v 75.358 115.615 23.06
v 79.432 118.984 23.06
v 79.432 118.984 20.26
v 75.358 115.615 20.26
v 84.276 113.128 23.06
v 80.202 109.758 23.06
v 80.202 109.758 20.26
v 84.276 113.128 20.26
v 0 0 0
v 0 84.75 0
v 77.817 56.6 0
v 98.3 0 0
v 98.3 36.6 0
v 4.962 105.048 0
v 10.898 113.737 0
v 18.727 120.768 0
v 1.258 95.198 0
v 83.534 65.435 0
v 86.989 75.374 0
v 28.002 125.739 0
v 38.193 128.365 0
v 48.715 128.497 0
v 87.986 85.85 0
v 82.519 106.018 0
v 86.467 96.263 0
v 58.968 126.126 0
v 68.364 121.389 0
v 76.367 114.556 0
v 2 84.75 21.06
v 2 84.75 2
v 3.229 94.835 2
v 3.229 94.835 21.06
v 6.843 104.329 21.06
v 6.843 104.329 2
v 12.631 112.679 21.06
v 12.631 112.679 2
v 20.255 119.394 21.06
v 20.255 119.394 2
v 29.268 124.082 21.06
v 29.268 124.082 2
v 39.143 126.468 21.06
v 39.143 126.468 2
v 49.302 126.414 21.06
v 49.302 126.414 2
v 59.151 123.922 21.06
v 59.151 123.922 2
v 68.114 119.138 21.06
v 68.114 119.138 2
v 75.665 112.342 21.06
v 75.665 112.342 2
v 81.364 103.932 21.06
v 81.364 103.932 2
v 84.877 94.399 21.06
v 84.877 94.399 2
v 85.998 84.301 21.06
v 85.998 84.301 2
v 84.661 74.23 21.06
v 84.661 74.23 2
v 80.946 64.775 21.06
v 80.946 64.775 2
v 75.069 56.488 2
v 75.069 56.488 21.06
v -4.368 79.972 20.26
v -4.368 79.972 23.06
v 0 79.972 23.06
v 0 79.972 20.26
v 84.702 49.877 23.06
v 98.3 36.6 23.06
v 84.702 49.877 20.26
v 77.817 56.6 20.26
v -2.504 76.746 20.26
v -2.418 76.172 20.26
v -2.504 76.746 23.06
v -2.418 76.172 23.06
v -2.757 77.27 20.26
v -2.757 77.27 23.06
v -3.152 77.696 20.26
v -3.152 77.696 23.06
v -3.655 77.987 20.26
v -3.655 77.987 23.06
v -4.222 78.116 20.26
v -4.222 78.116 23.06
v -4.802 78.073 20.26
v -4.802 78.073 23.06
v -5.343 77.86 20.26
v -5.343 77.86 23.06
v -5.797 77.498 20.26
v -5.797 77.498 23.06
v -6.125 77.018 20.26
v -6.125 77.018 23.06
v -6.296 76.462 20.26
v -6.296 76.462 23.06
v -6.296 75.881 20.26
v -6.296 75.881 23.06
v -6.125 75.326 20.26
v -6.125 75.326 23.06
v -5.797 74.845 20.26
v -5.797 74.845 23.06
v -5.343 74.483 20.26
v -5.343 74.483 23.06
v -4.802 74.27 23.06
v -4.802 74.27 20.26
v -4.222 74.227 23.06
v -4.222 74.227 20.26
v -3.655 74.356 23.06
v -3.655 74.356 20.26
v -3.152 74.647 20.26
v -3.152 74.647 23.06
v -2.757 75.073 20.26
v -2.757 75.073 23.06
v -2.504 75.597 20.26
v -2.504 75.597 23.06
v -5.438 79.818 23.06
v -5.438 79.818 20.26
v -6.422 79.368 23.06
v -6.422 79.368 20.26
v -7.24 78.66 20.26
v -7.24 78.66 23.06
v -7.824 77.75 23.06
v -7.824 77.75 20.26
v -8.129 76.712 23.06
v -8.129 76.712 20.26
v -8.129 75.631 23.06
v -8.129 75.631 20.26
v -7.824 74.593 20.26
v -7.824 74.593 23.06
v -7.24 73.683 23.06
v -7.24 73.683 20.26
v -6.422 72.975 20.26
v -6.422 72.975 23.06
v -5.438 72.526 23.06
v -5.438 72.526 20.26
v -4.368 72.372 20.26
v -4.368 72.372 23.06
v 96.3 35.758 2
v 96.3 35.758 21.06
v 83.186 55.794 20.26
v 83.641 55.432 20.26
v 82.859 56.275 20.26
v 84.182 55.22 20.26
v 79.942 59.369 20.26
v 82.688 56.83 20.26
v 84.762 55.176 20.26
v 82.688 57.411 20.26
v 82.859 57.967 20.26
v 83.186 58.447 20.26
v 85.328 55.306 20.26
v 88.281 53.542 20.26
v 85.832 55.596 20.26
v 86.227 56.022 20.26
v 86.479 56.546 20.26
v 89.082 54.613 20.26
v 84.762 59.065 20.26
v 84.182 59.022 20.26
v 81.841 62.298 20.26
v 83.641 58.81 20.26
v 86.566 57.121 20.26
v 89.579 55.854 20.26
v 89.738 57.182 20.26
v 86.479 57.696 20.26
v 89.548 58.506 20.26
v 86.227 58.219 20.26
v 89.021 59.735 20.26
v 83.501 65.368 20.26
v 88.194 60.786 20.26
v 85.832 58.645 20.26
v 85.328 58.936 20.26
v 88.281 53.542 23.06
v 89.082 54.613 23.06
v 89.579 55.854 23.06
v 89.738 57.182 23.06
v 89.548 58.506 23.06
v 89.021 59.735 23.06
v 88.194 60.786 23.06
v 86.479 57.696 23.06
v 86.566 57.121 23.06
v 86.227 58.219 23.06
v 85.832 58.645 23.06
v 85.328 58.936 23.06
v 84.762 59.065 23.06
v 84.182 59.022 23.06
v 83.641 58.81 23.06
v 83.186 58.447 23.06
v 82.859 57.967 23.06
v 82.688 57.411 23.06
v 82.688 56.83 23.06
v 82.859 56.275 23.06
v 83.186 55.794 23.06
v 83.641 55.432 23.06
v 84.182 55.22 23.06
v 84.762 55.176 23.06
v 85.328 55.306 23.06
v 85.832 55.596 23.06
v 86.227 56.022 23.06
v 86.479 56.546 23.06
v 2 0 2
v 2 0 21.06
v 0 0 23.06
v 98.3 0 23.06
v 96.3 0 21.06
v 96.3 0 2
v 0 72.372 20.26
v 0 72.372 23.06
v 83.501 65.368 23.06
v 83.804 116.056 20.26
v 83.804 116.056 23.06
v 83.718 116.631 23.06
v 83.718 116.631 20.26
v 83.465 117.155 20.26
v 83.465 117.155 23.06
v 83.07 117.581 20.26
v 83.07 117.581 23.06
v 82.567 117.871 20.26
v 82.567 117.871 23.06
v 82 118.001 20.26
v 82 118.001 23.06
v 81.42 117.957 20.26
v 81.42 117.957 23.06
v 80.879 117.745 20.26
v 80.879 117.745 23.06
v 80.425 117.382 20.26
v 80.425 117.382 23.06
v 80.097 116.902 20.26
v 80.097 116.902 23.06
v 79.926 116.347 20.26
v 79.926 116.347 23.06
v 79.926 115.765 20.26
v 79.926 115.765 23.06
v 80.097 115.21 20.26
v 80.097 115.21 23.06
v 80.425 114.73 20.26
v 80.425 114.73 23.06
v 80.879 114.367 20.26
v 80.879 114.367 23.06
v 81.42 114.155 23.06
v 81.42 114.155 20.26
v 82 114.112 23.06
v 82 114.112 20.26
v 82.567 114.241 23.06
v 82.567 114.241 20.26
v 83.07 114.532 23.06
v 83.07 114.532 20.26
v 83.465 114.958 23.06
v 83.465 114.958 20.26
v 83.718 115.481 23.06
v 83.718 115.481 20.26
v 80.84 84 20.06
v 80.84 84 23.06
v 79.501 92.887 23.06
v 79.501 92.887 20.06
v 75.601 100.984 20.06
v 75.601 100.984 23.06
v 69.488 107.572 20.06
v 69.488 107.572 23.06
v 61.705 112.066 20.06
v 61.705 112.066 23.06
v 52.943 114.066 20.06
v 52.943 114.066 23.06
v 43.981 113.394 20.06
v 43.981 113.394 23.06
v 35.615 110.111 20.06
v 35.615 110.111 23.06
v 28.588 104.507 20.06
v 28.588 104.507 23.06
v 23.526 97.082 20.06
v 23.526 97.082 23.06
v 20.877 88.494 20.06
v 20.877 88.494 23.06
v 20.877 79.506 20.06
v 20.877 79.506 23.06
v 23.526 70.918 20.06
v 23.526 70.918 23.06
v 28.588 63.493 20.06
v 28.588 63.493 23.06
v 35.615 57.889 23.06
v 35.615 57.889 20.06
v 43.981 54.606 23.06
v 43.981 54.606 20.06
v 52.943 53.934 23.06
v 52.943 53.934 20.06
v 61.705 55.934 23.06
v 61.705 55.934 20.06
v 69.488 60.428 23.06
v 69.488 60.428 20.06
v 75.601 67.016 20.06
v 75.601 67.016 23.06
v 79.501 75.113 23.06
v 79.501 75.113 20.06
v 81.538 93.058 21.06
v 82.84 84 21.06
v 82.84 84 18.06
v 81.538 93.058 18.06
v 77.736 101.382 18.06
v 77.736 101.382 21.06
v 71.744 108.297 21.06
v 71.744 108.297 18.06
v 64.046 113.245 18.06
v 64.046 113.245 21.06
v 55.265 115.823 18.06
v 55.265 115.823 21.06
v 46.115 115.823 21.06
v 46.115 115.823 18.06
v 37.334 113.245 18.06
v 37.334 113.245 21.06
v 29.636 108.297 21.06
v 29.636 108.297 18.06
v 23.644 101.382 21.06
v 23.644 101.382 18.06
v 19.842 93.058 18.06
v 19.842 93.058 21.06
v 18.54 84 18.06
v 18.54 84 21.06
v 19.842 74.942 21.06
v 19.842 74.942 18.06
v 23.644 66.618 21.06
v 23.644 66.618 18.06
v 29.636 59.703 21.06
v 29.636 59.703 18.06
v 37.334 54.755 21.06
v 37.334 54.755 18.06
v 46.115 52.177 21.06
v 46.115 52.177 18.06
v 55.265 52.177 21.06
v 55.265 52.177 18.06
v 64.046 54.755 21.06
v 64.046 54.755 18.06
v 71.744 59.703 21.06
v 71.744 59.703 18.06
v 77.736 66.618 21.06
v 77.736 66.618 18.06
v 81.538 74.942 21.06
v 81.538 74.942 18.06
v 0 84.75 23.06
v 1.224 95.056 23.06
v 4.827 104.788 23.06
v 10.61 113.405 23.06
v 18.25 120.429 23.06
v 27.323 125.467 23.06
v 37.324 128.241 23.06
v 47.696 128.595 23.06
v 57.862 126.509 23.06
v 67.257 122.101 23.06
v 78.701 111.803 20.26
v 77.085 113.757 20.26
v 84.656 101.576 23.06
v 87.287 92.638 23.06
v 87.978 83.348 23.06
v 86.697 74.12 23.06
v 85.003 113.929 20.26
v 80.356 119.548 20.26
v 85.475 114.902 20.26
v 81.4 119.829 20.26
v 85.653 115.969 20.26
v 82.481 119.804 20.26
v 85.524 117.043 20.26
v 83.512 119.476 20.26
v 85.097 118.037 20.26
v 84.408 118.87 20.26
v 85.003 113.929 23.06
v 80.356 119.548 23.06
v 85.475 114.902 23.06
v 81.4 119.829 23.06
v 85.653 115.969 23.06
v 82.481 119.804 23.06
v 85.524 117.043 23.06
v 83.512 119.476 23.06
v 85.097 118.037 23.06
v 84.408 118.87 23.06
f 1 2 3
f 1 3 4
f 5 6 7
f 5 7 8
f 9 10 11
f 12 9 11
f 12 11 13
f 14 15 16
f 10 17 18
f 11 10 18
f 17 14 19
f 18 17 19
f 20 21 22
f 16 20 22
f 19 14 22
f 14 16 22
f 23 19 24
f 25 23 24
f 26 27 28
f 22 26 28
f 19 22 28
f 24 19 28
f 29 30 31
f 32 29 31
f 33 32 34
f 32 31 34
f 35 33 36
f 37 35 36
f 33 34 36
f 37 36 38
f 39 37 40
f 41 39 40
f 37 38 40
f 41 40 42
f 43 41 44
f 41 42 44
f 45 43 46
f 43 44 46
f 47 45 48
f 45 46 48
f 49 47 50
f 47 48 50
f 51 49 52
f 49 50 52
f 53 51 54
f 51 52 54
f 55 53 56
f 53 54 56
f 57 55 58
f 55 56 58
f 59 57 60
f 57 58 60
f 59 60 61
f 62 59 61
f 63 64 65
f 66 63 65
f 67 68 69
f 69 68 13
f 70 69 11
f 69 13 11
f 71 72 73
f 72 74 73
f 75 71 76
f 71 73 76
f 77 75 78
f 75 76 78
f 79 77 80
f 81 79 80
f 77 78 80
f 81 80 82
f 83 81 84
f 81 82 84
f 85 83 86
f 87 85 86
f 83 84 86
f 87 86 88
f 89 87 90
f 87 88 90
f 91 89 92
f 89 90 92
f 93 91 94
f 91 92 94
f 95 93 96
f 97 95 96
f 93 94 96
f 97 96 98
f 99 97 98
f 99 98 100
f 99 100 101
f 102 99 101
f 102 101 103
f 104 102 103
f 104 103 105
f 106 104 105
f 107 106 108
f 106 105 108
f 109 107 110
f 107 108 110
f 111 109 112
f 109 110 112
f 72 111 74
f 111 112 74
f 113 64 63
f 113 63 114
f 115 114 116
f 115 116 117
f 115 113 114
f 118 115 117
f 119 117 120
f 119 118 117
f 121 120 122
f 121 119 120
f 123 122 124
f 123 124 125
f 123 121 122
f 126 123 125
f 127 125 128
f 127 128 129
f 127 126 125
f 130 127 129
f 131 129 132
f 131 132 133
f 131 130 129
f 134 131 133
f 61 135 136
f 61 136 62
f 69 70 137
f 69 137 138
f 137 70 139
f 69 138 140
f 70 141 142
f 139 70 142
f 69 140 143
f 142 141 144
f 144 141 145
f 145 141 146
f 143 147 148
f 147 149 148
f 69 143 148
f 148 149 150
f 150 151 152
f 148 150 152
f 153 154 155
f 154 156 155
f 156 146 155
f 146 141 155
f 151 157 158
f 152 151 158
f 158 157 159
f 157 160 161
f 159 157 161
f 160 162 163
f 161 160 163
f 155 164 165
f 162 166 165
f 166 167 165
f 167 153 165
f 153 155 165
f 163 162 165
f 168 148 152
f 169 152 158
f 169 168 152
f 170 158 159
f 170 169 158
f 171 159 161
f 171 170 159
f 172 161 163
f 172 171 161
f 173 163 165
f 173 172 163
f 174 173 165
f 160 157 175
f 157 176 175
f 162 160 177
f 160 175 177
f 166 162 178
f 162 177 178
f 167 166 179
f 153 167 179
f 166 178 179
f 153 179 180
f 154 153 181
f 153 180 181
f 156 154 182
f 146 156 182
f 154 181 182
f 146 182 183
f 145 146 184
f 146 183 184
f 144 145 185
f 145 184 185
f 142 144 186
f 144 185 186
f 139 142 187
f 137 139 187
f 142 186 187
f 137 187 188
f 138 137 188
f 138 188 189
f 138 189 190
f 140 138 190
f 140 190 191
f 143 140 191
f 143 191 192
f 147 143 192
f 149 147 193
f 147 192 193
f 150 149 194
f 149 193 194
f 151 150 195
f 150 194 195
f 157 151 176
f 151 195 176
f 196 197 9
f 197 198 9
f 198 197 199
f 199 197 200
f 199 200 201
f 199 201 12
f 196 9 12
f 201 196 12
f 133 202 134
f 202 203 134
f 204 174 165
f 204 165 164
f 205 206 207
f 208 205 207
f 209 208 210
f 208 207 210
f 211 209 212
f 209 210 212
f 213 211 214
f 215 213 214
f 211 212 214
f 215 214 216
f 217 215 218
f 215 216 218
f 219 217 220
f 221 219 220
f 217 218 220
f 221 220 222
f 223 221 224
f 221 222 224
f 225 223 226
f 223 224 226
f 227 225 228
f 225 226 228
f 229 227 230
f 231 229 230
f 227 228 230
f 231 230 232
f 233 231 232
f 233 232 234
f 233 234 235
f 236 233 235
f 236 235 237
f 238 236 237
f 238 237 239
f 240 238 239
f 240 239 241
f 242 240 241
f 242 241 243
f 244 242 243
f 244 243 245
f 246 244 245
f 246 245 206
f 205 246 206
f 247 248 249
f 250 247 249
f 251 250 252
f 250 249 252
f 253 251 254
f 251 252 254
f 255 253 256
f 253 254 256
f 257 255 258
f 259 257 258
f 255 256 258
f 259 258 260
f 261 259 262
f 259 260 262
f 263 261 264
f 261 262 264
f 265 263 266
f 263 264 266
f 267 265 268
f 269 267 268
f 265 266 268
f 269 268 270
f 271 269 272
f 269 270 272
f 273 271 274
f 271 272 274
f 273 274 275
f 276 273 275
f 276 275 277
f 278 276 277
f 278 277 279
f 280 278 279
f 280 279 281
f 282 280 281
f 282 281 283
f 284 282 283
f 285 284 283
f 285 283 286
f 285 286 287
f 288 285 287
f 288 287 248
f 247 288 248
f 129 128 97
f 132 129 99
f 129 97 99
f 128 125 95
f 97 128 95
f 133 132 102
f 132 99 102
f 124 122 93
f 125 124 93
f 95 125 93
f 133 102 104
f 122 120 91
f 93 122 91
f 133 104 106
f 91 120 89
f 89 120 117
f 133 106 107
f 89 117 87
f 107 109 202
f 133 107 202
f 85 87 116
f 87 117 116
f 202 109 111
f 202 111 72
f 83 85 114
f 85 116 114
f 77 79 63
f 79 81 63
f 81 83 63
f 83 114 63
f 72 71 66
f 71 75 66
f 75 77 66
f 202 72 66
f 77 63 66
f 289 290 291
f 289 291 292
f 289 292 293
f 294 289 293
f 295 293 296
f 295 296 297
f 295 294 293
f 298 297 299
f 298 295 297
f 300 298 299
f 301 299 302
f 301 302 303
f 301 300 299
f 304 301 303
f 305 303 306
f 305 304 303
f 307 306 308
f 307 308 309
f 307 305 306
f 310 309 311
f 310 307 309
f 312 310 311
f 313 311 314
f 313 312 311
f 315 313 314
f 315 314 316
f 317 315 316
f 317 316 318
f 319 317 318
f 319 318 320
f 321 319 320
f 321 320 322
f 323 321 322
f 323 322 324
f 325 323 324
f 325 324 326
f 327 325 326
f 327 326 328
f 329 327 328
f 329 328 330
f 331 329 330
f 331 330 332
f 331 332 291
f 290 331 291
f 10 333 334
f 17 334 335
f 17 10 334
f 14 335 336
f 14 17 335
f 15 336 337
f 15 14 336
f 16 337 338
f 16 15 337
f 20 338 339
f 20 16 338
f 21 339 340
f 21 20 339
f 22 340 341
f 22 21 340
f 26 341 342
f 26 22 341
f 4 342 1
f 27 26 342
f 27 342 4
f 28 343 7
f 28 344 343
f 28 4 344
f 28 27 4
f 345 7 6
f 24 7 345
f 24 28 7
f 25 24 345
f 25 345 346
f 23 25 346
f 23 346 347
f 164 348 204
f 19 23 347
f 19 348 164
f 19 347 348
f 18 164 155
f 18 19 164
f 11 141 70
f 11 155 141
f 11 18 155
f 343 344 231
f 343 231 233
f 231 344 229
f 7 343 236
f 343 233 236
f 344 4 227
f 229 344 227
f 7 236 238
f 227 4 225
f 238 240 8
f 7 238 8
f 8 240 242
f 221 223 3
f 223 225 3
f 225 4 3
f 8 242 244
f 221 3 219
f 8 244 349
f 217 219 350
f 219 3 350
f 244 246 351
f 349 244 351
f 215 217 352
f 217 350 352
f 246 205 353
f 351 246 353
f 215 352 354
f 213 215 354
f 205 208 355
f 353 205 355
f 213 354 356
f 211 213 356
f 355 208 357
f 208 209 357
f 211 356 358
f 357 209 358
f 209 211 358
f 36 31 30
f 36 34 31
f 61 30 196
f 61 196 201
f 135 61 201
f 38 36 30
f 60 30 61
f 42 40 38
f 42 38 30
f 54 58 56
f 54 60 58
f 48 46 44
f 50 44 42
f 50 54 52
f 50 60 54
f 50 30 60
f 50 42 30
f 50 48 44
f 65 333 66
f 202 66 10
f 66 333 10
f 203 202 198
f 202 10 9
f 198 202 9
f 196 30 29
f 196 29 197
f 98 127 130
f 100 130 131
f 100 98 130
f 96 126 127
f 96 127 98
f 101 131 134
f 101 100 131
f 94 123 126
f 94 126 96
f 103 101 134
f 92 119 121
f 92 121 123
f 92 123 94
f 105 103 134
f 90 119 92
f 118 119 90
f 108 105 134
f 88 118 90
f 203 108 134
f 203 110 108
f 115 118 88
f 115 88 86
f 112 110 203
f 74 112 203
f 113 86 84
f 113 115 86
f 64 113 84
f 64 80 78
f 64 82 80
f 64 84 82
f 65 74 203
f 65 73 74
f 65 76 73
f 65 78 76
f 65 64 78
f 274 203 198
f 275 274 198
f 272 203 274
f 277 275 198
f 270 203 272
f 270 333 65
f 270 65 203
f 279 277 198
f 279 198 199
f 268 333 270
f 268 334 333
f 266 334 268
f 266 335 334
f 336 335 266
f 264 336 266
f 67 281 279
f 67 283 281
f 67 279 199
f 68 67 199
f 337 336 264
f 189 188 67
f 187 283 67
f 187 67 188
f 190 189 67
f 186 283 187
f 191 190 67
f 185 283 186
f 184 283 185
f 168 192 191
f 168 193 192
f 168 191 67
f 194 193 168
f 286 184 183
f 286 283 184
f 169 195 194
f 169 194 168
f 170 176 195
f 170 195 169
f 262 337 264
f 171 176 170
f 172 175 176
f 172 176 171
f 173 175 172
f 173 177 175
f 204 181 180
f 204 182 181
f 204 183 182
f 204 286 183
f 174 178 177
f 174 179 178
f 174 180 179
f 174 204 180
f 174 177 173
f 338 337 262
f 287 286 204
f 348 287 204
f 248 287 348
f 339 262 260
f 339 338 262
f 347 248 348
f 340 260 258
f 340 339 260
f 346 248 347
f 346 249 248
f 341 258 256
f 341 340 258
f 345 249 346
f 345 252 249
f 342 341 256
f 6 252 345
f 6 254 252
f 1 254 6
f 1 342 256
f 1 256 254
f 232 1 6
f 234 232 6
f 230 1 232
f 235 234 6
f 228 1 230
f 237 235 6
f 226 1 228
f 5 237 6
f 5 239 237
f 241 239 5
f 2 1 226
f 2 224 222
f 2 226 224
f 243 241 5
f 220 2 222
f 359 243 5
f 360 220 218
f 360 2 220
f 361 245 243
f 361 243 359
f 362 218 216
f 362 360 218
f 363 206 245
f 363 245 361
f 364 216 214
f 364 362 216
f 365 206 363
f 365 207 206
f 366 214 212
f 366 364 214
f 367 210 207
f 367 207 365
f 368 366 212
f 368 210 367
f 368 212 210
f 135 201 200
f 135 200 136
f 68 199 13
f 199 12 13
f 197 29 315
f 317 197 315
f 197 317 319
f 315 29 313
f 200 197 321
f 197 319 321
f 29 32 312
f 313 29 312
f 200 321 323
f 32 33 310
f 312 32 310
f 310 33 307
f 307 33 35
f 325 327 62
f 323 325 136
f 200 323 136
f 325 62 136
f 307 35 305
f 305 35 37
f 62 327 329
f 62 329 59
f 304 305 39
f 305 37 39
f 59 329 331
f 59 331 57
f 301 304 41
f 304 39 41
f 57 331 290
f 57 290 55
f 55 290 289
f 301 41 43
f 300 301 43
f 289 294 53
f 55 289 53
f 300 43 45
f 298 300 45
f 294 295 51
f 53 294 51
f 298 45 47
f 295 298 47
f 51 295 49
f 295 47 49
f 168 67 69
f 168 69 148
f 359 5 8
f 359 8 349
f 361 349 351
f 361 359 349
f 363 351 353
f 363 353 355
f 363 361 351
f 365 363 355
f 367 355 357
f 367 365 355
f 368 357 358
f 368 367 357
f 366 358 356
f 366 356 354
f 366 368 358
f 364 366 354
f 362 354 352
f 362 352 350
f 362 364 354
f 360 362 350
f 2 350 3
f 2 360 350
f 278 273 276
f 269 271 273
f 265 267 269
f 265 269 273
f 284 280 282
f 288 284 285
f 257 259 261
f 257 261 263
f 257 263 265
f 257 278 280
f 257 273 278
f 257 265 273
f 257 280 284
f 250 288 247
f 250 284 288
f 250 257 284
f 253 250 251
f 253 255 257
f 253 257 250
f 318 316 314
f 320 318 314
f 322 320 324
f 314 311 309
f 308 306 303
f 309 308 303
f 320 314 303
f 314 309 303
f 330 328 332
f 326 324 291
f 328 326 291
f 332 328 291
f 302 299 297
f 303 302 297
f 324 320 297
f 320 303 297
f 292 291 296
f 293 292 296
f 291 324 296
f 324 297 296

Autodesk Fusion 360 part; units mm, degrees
sketch "Esquisse1" plane through (0, 0, 0) normal (0, 0, 1) x (1, 0, 0)
  line L0 (0, 0) -> (98.3, 0)
  line L1 (98.3, 0) -> (98.3, 36.6)
  line L2 (98.3, 36.6) -> (77.8168, 56.6)
  arc A0 (77.8168, 56.6) -> (0, 84.75) centre (44, 84.75) ccw
  line L3 (0, 84.75) -> (0, 0)
  circle A1 centre (50.69, 84) radius 30.15
  point P0 (44, 128.75)
  point P1 (80.84, 84)
  point P2 (88, 84.75)
  point P3 (50.69, 114.15)
  dimension "d1" = 98.3
  dimension "d2" = 36.6
  dimension "d3" = 128.75
  dimension "d4" = 44
  dimension "d5" = 56.6
  dimension "d6" = 60.3
  dimension "d23" = 7.16
  dimension "d24" = 14.6
extrude "Extrusion1" add sketch "Esquisse1" along normal blind 23.06 contours L0 L1 L2 A0 L3 | A1
extrude "Extrusion2" cut sketch "Esquisse1" against normal blind 3 from surface at 23.06 contours A1
shell "Coque1" thickness 2 removed faces 1 at (32.7667, 0, 7.6867)
ref_plane "Plan de construction1" through (49.3725, 68.154, 23.06) normal (0, 0, 1) x (1, 0, 0)
sketch "Esquisse2" plane through (0, 0, 23.06) normal (0, 0, 1) x (1, 0, 0)
  circle A0 centre (84.6158, 57.1208) radius 1.95
  circle A1 centre (81.8543, 116.0561) radius 1.95
  circle A2 centre (-4.3677, 76.1716) radius 1.95
  line L0 (81.8543, 116.0561) -> (84.6158, 57.1208) construction
  line L1 (84.6158, 57.1208) -> (-4.3677, 76.1716) construction
  line L2 (81.8543, 116.0561) -> (-4.3677, 76.1716) construction
  circle A3 centre (44, 84.75) radius 49.1225 construction
  arc A4 (77.8168, 56.6) -> (0, 84.75) centre (44, 84.75) ccw construction
  circle A5 centre (84.6158, 57.1208) radius 5.1225
  line L3 (98.3, 36.6) -> (77.8168, 56.6) construction
  line L4 (84.7023, 49.877) -> (91.8596, 57.2072)
  line L5 (91.8596, 57.2072) -> (83.5013, 65.3684)
  line L6 (80.2019, 109.7584) -> (84.2761, 113.1278)
  arc A6 (84.2761, 113.1278) -> (79.4325, 118.9844) centre (81.8543, 116.0561) ccw
  line L7 (79.4325, 118.9844) -> (75.3584, 115.615)
  line L8 (0, 72.3716) -> (-4.3677, 72.3716)
  arc A7 (-4.3677, 79.9716) -> (-4.3677, 72.3716) centre (-4.3677, 76.1716) ccw
  line L9 (-4.3677, 79.9716) -> (0.2602, 79.9716)
  line L10 (81.8543, 116.0561) -> (44, 84.75) construction
  line L11 (44, 84.75) -> (84.6158, 57.1208) construction
  arc A8 (77.8168, 56.6) -> (0, 84.75) centre (44, 84.75) ccw
  line L12 (0, 84.75) -> (0, 0)
  line L13 (98.3, 36.6) -> (77.8168, 56.6)
  dimension "d15" = 3.9
  dimension "d16" = 59
  dimension "d17" = 95
  dimension "d18" = 91
  dimension "d19" = 7.6
  dimension "d20" = 7.6
extrude "Extrusion3" add sketch "Esquisse2" against normal blind 2.8 contours A5 | L8 A7 L9 L12 | L6 A6 L7 A8 | A5 L5 A8 | A5 L4 L13 | A5 A8 L13
equation "d4 = ( 88 / 2 ) * 1 mm"
equation "d20 = d19"
